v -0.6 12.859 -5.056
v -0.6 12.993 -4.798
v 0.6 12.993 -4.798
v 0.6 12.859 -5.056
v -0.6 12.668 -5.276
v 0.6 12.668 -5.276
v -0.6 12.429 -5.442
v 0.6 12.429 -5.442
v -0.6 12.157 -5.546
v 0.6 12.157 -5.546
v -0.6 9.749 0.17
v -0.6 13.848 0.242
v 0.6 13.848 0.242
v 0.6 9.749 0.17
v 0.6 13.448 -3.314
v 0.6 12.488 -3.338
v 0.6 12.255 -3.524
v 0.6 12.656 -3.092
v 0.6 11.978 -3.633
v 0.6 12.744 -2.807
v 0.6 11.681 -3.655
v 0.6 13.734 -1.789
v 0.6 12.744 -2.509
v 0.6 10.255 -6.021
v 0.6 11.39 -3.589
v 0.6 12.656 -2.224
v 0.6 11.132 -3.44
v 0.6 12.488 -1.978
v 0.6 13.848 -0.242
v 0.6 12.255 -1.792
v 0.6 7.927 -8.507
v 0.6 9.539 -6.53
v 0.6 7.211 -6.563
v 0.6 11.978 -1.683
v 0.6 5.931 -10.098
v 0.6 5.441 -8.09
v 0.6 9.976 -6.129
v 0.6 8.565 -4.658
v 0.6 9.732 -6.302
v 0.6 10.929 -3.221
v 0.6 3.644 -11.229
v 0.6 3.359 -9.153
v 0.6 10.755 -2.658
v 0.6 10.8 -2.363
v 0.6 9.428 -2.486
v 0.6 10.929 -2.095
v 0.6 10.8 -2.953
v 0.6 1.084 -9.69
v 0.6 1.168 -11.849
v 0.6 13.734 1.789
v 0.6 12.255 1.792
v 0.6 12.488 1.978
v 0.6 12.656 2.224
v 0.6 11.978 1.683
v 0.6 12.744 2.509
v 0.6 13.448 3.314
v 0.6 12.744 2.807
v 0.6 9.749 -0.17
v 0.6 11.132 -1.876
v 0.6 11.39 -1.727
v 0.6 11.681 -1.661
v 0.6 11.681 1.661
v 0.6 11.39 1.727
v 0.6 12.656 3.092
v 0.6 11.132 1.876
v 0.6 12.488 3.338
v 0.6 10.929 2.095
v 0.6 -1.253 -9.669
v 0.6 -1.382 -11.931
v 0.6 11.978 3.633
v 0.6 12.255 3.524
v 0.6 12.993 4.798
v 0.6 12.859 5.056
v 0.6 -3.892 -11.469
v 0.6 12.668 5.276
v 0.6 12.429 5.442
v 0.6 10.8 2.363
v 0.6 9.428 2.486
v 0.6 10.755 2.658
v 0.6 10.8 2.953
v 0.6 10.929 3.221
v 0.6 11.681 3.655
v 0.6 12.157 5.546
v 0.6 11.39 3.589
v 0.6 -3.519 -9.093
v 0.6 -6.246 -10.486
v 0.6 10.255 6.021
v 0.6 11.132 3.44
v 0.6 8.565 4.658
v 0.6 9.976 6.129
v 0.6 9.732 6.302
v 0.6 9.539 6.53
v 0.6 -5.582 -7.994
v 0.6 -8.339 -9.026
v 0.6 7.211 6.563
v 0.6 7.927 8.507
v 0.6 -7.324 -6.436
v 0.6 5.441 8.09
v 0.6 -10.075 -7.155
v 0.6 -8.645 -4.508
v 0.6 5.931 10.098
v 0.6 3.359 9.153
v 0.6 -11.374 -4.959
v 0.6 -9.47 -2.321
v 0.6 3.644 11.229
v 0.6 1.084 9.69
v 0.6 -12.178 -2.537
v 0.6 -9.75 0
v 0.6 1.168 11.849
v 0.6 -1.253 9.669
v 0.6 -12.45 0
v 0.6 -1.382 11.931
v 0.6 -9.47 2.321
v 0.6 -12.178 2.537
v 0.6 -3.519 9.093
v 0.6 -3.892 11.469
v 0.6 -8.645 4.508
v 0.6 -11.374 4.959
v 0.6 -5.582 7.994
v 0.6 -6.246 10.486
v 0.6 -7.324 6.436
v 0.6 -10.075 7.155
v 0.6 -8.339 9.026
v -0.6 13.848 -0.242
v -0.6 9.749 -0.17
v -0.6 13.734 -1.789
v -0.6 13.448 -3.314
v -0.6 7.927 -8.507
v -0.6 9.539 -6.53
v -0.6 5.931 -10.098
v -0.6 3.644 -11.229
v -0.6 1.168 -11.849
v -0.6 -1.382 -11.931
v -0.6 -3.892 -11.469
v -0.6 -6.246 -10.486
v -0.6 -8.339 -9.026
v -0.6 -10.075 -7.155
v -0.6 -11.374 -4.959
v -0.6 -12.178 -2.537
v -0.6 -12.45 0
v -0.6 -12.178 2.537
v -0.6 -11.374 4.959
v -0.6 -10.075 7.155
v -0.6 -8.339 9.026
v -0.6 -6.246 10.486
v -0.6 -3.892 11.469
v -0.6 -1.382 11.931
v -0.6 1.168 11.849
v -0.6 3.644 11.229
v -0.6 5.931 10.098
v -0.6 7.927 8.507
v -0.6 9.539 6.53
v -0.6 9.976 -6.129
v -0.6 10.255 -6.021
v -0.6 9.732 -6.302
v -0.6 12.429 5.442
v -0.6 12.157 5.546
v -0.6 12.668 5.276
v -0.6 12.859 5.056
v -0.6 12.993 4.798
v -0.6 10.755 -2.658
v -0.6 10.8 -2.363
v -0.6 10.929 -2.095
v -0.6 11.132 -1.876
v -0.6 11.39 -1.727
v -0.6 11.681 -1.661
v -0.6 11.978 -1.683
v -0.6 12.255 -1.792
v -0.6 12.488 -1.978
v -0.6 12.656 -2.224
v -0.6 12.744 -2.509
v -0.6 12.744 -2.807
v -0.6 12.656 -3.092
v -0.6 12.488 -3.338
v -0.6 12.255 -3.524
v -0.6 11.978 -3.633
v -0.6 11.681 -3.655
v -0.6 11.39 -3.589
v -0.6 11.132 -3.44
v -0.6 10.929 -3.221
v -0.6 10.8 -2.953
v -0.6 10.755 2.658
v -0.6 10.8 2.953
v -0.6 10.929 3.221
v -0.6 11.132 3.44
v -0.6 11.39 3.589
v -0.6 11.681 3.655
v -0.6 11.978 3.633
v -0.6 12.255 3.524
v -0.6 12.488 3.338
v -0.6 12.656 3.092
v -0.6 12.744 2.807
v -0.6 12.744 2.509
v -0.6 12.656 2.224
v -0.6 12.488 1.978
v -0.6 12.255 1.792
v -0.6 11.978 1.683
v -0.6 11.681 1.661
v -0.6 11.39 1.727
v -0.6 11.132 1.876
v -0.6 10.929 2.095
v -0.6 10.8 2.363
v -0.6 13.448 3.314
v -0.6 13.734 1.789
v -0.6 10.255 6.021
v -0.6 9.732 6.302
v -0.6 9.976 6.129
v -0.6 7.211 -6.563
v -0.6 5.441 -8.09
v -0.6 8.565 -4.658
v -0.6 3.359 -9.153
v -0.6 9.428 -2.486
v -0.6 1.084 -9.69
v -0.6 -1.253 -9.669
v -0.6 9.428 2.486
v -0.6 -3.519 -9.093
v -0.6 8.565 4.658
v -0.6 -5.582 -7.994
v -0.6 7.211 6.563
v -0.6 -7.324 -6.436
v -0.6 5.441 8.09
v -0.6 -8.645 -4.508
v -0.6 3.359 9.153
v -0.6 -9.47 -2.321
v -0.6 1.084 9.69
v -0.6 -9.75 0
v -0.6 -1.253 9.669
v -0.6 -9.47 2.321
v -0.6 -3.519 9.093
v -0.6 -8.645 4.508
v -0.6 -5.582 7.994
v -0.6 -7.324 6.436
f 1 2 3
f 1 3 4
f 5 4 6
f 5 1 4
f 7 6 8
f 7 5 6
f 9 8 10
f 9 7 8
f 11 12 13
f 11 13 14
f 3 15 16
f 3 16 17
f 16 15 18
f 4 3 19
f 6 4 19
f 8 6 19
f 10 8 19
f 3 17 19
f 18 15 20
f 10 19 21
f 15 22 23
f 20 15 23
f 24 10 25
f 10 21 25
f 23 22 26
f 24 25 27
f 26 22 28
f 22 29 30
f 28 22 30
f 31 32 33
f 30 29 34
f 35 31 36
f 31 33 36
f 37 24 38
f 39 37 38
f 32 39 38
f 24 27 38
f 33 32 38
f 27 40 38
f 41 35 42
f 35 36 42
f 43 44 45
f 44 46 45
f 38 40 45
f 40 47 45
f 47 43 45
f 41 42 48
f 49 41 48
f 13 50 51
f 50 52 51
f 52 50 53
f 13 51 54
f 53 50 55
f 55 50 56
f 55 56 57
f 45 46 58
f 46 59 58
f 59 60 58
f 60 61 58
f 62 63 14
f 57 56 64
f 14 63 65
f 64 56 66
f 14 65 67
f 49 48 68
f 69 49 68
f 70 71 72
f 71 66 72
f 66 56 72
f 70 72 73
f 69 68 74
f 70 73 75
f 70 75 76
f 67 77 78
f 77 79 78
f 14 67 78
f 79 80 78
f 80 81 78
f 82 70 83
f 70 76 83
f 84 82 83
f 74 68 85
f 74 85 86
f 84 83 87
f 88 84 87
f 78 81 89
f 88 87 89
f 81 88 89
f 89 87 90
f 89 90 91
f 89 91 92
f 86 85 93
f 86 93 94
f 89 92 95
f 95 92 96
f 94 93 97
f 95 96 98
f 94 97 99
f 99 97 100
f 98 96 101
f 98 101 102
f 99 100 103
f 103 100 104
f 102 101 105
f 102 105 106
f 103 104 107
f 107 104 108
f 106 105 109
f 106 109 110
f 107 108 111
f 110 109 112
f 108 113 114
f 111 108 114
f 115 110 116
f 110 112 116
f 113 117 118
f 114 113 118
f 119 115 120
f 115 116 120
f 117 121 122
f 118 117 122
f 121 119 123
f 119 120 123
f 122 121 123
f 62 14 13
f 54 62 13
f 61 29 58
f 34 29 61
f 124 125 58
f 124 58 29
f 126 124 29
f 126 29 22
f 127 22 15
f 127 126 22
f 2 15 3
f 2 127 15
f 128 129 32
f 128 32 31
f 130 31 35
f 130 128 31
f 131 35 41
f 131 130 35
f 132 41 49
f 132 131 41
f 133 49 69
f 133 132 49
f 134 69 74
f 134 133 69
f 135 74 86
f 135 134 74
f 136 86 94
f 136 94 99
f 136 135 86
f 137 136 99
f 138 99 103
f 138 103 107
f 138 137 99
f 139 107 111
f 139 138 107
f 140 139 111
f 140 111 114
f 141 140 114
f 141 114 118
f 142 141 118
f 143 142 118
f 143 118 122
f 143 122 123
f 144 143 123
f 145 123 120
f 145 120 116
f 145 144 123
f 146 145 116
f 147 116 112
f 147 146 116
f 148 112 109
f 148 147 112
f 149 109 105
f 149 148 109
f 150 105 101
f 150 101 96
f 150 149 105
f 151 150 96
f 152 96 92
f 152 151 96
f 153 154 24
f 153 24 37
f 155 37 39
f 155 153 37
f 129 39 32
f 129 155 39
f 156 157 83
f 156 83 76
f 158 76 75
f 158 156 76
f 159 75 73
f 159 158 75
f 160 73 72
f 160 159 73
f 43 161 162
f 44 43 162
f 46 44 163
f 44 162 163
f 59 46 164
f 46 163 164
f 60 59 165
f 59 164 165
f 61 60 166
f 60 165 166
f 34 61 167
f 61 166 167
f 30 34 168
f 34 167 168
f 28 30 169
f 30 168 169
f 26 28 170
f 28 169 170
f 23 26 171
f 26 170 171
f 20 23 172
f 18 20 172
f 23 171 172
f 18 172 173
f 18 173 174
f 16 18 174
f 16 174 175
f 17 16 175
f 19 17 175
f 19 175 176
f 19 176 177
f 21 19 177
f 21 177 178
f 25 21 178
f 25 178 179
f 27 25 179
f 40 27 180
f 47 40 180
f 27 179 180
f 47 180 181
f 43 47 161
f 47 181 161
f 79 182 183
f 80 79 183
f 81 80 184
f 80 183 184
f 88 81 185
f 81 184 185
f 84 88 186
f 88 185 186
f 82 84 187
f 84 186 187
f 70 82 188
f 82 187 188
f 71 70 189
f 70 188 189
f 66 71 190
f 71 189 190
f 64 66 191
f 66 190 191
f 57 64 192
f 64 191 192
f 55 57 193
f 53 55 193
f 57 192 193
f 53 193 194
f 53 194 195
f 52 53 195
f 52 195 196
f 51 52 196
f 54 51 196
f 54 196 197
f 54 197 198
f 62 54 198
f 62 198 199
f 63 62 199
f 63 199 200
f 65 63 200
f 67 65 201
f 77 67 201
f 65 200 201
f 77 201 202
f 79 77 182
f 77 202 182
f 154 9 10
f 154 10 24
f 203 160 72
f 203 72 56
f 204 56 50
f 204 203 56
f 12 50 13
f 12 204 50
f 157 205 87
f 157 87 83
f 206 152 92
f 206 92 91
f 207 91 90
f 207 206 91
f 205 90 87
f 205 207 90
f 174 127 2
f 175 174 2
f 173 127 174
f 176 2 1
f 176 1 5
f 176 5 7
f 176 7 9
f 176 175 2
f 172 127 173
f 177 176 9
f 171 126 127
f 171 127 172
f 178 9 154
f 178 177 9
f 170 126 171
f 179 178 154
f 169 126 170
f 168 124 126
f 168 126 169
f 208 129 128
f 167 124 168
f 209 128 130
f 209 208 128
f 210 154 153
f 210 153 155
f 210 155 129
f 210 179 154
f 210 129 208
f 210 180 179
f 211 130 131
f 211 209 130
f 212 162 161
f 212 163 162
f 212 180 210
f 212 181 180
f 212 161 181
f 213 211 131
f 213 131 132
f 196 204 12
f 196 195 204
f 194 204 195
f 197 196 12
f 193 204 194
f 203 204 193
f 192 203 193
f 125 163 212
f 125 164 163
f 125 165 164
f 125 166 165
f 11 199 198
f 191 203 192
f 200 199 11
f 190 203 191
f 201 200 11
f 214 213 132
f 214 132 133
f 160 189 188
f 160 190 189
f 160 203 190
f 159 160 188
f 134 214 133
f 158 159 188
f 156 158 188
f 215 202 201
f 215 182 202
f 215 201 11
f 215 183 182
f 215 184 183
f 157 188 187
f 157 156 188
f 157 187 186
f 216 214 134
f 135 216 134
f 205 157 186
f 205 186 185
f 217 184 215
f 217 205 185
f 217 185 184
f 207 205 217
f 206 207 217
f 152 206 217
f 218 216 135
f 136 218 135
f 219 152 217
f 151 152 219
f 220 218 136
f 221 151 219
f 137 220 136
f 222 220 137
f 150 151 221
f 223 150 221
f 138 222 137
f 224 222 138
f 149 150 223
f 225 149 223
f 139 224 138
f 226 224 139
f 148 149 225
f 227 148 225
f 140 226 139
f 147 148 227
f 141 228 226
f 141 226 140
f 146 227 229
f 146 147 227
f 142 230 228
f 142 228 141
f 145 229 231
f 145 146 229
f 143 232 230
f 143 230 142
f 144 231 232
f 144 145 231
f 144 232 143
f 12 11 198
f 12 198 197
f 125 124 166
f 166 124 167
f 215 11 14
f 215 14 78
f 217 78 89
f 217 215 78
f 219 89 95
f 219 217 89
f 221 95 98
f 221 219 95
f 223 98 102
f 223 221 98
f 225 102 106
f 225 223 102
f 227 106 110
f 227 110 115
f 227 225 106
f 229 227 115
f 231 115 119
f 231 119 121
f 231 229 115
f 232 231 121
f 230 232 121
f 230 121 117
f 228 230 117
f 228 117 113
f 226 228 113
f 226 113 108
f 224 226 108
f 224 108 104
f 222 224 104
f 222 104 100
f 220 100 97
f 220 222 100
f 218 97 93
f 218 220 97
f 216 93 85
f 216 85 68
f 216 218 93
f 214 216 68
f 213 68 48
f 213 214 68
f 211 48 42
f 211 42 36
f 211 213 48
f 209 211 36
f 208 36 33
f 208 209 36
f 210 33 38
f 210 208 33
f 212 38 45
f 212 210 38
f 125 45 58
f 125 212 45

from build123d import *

# Parameters (mm, degrees)
SKETCH1_R           = 1
BOSS_EXTRUDE1_DEPTH = 1.2


with BuildPart() as part:
    # Sketch1 → Boss-Extrude1 (new body)
    with BuildSketch(Plane(origin=(-0.6, 0, 0), x_dir=(0, -1, 0), z_dir=(-1, 0, 0))):
        with BuildLine():
            Line((-10.254517122, 6.020654884), (-12.157117236, 5.546283398))
            ThreePointArc((-12.157117236, 5.546283398), (-12.667686664, 5.275571693), (-12.992516349, 4.797605541))
            ThreePointArc((-12.992516349, 4.797605541), (-13.612159776, 2.555700733), (-13.847890578, 0.241715829))
            Line((-13.847890578, 0.241715829), (-9.748515028, 0.170160963))
            ThreePointArc((-9.748515028, 0.170160963), (9.75, 0), (-9.748515028, -0.170160963))
            Line((-9.748515028, -0.170160963), (-13.847890578, -0.241715829))
            ThreePointArc((-13.847890578, -0.241715829), (-13.612159776, -2.555700733), (-12.992516349, -4.797605541))
            ThreePointArc((-12.992516349, -4.797605541), (-12.667686664, -5.275571693), (-12.157117236, -5.546283398))
            Line((-12.157117236, -5.546283398), (-10.254517122, -6.020654884))
            ThreePointArc((-10.254517122, -6.020654884), (-9.848654609, -6.207590185), (-9.539322273, -6.530053659))
            ThreePointArc((-9.539322273, -6.530053659), (12.45, 0), (-9.539322273, 6.530053659))
            ThreePointArc((-9.539322273, 6.530053659), (-9.848654609, 6.207590185), (-10.254517122, 6.020654884))
        make_face()
        with Locations((-11.755399891, -2.658115574)):
            Circle(SKETCH1_R, mode=Mode.SUBTRACT)
        with Locations((-11.755399891, 2.658115574)):
            Circle(SKETCH1_R, mode=Mode.SUBTRACT)
    extrude(amount=-BOSS_EXTRUDE1_DEPTH)


solid = part.part
